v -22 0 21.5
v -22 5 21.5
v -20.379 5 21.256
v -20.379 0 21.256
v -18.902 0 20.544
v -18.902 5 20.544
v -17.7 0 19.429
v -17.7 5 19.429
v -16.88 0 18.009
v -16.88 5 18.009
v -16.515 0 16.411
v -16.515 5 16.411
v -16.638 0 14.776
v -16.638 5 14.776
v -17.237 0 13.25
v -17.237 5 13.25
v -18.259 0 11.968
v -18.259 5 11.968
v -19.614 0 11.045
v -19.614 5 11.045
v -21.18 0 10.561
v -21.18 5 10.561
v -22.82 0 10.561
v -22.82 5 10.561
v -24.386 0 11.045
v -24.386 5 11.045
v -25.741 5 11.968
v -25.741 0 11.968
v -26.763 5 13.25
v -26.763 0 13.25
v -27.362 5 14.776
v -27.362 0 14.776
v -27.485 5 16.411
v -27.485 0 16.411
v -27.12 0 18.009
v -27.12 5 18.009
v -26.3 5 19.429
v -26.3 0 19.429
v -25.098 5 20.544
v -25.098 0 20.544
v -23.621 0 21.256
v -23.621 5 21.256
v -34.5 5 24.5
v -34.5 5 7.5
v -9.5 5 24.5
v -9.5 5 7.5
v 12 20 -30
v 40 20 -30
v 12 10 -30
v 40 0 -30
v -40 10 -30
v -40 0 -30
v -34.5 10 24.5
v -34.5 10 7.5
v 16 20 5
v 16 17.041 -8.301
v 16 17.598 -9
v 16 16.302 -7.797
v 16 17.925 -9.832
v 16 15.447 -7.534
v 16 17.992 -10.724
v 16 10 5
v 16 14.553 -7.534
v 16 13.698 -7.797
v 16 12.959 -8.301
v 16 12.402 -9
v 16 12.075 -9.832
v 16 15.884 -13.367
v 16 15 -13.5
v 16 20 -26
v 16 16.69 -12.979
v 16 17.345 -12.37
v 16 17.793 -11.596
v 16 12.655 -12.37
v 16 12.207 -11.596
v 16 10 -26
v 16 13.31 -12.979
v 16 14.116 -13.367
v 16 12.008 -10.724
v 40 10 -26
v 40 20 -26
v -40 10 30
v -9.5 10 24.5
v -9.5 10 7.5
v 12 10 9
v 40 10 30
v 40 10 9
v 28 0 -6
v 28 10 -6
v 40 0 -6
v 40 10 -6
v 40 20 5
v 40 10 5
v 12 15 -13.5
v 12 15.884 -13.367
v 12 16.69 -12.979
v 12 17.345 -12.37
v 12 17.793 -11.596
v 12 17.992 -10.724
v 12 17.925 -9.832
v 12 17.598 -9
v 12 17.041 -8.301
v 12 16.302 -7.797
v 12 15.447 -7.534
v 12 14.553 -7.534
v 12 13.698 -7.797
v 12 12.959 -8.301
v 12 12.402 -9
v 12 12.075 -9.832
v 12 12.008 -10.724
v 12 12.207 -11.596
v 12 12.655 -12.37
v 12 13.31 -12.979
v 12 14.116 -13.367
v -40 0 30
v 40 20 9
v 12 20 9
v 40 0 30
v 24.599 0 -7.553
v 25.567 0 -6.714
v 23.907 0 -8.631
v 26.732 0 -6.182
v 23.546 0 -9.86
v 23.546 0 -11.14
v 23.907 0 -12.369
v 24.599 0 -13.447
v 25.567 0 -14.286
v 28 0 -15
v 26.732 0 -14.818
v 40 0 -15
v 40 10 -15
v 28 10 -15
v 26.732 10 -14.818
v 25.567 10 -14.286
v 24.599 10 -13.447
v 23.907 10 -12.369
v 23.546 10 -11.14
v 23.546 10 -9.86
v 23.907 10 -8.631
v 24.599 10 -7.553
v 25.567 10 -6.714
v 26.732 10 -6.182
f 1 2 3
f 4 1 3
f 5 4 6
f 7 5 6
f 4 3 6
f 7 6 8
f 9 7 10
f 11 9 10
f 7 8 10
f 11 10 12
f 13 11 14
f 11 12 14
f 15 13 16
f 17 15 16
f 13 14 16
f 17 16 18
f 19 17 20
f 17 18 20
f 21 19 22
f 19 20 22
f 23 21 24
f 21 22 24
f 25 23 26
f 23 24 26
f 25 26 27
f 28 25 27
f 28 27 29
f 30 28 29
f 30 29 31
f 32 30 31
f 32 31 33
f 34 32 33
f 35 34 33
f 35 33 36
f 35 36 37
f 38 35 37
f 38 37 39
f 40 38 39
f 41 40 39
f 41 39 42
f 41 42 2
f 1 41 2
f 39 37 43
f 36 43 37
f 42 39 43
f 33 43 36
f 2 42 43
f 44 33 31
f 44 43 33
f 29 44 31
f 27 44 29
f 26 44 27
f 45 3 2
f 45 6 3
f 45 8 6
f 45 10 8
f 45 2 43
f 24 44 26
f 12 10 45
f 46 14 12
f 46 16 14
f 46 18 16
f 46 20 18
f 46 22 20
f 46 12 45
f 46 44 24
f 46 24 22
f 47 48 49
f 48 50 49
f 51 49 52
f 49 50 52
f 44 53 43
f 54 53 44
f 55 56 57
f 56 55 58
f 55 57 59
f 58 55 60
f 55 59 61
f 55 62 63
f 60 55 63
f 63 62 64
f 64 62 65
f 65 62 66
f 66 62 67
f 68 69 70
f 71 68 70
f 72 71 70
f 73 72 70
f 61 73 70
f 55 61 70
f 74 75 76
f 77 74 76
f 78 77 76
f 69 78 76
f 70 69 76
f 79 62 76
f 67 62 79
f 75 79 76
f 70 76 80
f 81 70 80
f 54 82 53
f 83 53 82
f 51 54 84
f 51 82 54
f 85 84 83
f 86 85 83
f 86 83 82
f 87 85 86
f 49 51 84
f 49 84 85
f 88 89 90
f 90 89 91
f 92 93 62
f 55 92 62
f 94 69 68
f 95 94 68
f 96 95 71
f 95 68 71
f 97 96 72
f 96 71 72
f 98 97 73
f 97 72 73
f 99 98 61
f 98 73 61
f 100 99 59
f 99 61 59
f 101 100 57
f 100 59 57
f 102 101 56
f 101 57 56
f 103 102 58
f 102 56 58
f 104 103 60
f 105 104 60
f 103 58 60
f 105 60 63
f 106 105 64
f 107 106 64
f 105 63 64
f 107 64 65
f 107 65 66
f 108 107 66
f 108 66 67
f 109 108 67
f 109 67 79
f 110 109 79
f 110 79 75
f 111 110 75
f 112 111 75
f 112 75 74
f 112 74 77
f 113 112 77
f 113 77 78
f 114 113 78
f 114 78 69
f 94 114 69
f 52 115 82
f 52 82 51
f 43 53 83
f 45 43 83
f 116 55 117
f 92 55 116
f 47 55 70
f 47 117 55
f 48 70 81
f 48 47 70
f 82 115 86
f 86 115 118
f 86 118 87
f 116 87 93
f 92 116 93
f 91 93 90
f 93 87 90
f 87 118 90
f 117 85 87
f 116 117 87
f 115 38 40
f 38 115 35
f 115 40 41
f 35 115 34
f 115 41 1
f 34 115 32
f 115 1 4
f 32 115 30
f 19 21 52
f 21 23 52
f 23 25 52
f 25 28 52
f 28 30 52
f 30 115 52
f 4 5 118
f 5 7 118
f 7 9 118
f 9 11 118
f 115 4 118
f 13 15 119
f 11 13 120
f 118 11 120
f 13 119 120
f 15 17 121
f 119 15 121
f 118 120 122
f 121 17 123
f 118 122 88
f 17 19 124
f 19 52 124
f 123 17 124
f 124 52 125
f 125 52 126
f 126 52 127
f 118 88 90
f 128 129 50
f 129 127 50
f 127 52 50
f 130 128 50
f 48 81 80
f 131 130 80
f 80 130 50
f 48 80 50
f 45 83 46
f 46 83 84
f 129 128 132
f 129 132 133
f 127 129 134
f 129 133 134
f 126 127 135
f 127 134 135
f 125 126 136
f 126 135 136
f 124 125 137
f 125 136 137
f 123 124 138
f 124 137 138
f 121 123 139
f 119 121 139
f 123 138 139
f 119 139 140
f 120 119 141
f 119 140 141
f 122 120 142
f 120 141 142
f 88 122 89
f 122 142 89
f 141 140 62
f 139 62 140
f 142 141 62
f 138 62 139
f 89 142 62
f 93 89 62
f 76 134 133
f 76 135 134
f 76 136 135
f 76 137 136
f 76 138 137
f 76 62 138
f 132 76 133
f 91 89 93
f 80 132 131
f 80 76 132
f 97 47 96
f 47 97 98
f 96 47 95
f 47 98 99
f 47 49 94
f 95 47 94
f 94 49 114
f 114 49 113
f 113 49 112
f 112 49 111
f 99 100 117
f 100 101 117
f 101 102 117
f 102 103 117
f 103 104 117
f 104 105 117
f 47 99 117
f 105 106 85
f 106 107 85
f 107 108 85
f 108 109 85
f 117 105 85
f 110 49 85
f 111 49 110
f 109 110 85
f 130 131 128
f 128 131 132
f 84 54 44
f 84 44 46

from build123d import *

# Parameters (mm, degrees)
SKETCH_1_W          = 80
SKETCH_1_H          = 60
EXTRUDE_1_DEPTH     = 10
SKETCH_2_R          = 5.5
SKETCH_2_R_2        = 4.5
CUT_EXTRUDE_1_DEPTH = 51.990195136
EXTRUDE_2_DEPTH     = 10
SKETCH_5_R          = 3
CUT_EXTRUDE_3_DEPTH = 67.603303221
SKETCH_6_W          = 25
SKETCH_6_H          = 17
CUT_EXTRUDE_4_DEPTH = 5


with BuildPart() as part:
    # Эскиз1 → Бобышка-Вытянуть1 (new body)
    with BuildSketch(Plane(origin=(0, 0, 0), x_dir=(1, 0, 0), z_dir=(0, 1, 0))):
        Rectangle(SKETCH_1_W, SKETCH_1_H)
    extrude(amount=EXTRUDE_1_DEPTH)

    # Эскиз2 → Вырез-Вытянуть1 (cut, through all)
    with BuildSketch(Plane(origin=(0, 10, 0), x_dir=(1, 0, 0), z_dir=(0, 1, 0))):
        with Locations(Location((-22, -16, 0), (0, 0, 270))):
            Circle(SKETCH_2_R)
        with Locations((28, 10.5)):
            Circle(SKETCH_2_R_2)
        with BuildLine():
            ThreePointArc((32.5, 10.5), (31.181980515, 7.318019485), (28, 6))
            Line((28, 6), (40, 6))
            Line((40, 6), (40, 15))
            Line((40, 15), (28, 15))
            ThreePointArc((28, 15), (31.181980515, 13.681980515), (32.5, 10.5))
        make_face()
    extrude(amount=-CUT_EXTRUDE_1_DEPTH, mode=Mode.SUBTRACT)

    # Эскиз4 → Бобышка-Вытянуть2 (add)
    with BuildSketch(Plane(origin=(0, 10, 0), x_dir=(1, 0, 0), z_dir=(0, 1, 0))):
        Polygon((40, -9), (40, -5), (16, -5), (16, 26), (40, 26), (40, 30), (12, 30), (12, -9), align=None)
    extrude(amount=EXTRUDE_2_DEPTH)

    # Эскиз5 → Вырез-Вытянуть3 (cut, through all)
    with BuildSketch(Plane(origin=(16, 0, 0), x_dir=(0, 0, -1), z_dir=(1, 0, 0))):
        with Locations((10.5, 15)):
            Circle(SKETCH_5_R)
    extrude(amount=-CUT_EXTRUDE_3_DEPTH, mode=Mode.SUBTRACT)

    # Эскиз6 → Вырез-Вытянуть4 (cut)
    with BuildSketch(Plane(origin=(0, 10, 0), x_dir=(1, 0, 0), z_dir=(0, 1, 0))):
        with Locations((-22, -16)):
            Rectangle(SKETCH_6_W, SKETCH_6_H)
    extrude(amount=-CUT_EXTRUDE_4_DEPTH, mode=Mode.SUBTRACT)


solid = part.part
